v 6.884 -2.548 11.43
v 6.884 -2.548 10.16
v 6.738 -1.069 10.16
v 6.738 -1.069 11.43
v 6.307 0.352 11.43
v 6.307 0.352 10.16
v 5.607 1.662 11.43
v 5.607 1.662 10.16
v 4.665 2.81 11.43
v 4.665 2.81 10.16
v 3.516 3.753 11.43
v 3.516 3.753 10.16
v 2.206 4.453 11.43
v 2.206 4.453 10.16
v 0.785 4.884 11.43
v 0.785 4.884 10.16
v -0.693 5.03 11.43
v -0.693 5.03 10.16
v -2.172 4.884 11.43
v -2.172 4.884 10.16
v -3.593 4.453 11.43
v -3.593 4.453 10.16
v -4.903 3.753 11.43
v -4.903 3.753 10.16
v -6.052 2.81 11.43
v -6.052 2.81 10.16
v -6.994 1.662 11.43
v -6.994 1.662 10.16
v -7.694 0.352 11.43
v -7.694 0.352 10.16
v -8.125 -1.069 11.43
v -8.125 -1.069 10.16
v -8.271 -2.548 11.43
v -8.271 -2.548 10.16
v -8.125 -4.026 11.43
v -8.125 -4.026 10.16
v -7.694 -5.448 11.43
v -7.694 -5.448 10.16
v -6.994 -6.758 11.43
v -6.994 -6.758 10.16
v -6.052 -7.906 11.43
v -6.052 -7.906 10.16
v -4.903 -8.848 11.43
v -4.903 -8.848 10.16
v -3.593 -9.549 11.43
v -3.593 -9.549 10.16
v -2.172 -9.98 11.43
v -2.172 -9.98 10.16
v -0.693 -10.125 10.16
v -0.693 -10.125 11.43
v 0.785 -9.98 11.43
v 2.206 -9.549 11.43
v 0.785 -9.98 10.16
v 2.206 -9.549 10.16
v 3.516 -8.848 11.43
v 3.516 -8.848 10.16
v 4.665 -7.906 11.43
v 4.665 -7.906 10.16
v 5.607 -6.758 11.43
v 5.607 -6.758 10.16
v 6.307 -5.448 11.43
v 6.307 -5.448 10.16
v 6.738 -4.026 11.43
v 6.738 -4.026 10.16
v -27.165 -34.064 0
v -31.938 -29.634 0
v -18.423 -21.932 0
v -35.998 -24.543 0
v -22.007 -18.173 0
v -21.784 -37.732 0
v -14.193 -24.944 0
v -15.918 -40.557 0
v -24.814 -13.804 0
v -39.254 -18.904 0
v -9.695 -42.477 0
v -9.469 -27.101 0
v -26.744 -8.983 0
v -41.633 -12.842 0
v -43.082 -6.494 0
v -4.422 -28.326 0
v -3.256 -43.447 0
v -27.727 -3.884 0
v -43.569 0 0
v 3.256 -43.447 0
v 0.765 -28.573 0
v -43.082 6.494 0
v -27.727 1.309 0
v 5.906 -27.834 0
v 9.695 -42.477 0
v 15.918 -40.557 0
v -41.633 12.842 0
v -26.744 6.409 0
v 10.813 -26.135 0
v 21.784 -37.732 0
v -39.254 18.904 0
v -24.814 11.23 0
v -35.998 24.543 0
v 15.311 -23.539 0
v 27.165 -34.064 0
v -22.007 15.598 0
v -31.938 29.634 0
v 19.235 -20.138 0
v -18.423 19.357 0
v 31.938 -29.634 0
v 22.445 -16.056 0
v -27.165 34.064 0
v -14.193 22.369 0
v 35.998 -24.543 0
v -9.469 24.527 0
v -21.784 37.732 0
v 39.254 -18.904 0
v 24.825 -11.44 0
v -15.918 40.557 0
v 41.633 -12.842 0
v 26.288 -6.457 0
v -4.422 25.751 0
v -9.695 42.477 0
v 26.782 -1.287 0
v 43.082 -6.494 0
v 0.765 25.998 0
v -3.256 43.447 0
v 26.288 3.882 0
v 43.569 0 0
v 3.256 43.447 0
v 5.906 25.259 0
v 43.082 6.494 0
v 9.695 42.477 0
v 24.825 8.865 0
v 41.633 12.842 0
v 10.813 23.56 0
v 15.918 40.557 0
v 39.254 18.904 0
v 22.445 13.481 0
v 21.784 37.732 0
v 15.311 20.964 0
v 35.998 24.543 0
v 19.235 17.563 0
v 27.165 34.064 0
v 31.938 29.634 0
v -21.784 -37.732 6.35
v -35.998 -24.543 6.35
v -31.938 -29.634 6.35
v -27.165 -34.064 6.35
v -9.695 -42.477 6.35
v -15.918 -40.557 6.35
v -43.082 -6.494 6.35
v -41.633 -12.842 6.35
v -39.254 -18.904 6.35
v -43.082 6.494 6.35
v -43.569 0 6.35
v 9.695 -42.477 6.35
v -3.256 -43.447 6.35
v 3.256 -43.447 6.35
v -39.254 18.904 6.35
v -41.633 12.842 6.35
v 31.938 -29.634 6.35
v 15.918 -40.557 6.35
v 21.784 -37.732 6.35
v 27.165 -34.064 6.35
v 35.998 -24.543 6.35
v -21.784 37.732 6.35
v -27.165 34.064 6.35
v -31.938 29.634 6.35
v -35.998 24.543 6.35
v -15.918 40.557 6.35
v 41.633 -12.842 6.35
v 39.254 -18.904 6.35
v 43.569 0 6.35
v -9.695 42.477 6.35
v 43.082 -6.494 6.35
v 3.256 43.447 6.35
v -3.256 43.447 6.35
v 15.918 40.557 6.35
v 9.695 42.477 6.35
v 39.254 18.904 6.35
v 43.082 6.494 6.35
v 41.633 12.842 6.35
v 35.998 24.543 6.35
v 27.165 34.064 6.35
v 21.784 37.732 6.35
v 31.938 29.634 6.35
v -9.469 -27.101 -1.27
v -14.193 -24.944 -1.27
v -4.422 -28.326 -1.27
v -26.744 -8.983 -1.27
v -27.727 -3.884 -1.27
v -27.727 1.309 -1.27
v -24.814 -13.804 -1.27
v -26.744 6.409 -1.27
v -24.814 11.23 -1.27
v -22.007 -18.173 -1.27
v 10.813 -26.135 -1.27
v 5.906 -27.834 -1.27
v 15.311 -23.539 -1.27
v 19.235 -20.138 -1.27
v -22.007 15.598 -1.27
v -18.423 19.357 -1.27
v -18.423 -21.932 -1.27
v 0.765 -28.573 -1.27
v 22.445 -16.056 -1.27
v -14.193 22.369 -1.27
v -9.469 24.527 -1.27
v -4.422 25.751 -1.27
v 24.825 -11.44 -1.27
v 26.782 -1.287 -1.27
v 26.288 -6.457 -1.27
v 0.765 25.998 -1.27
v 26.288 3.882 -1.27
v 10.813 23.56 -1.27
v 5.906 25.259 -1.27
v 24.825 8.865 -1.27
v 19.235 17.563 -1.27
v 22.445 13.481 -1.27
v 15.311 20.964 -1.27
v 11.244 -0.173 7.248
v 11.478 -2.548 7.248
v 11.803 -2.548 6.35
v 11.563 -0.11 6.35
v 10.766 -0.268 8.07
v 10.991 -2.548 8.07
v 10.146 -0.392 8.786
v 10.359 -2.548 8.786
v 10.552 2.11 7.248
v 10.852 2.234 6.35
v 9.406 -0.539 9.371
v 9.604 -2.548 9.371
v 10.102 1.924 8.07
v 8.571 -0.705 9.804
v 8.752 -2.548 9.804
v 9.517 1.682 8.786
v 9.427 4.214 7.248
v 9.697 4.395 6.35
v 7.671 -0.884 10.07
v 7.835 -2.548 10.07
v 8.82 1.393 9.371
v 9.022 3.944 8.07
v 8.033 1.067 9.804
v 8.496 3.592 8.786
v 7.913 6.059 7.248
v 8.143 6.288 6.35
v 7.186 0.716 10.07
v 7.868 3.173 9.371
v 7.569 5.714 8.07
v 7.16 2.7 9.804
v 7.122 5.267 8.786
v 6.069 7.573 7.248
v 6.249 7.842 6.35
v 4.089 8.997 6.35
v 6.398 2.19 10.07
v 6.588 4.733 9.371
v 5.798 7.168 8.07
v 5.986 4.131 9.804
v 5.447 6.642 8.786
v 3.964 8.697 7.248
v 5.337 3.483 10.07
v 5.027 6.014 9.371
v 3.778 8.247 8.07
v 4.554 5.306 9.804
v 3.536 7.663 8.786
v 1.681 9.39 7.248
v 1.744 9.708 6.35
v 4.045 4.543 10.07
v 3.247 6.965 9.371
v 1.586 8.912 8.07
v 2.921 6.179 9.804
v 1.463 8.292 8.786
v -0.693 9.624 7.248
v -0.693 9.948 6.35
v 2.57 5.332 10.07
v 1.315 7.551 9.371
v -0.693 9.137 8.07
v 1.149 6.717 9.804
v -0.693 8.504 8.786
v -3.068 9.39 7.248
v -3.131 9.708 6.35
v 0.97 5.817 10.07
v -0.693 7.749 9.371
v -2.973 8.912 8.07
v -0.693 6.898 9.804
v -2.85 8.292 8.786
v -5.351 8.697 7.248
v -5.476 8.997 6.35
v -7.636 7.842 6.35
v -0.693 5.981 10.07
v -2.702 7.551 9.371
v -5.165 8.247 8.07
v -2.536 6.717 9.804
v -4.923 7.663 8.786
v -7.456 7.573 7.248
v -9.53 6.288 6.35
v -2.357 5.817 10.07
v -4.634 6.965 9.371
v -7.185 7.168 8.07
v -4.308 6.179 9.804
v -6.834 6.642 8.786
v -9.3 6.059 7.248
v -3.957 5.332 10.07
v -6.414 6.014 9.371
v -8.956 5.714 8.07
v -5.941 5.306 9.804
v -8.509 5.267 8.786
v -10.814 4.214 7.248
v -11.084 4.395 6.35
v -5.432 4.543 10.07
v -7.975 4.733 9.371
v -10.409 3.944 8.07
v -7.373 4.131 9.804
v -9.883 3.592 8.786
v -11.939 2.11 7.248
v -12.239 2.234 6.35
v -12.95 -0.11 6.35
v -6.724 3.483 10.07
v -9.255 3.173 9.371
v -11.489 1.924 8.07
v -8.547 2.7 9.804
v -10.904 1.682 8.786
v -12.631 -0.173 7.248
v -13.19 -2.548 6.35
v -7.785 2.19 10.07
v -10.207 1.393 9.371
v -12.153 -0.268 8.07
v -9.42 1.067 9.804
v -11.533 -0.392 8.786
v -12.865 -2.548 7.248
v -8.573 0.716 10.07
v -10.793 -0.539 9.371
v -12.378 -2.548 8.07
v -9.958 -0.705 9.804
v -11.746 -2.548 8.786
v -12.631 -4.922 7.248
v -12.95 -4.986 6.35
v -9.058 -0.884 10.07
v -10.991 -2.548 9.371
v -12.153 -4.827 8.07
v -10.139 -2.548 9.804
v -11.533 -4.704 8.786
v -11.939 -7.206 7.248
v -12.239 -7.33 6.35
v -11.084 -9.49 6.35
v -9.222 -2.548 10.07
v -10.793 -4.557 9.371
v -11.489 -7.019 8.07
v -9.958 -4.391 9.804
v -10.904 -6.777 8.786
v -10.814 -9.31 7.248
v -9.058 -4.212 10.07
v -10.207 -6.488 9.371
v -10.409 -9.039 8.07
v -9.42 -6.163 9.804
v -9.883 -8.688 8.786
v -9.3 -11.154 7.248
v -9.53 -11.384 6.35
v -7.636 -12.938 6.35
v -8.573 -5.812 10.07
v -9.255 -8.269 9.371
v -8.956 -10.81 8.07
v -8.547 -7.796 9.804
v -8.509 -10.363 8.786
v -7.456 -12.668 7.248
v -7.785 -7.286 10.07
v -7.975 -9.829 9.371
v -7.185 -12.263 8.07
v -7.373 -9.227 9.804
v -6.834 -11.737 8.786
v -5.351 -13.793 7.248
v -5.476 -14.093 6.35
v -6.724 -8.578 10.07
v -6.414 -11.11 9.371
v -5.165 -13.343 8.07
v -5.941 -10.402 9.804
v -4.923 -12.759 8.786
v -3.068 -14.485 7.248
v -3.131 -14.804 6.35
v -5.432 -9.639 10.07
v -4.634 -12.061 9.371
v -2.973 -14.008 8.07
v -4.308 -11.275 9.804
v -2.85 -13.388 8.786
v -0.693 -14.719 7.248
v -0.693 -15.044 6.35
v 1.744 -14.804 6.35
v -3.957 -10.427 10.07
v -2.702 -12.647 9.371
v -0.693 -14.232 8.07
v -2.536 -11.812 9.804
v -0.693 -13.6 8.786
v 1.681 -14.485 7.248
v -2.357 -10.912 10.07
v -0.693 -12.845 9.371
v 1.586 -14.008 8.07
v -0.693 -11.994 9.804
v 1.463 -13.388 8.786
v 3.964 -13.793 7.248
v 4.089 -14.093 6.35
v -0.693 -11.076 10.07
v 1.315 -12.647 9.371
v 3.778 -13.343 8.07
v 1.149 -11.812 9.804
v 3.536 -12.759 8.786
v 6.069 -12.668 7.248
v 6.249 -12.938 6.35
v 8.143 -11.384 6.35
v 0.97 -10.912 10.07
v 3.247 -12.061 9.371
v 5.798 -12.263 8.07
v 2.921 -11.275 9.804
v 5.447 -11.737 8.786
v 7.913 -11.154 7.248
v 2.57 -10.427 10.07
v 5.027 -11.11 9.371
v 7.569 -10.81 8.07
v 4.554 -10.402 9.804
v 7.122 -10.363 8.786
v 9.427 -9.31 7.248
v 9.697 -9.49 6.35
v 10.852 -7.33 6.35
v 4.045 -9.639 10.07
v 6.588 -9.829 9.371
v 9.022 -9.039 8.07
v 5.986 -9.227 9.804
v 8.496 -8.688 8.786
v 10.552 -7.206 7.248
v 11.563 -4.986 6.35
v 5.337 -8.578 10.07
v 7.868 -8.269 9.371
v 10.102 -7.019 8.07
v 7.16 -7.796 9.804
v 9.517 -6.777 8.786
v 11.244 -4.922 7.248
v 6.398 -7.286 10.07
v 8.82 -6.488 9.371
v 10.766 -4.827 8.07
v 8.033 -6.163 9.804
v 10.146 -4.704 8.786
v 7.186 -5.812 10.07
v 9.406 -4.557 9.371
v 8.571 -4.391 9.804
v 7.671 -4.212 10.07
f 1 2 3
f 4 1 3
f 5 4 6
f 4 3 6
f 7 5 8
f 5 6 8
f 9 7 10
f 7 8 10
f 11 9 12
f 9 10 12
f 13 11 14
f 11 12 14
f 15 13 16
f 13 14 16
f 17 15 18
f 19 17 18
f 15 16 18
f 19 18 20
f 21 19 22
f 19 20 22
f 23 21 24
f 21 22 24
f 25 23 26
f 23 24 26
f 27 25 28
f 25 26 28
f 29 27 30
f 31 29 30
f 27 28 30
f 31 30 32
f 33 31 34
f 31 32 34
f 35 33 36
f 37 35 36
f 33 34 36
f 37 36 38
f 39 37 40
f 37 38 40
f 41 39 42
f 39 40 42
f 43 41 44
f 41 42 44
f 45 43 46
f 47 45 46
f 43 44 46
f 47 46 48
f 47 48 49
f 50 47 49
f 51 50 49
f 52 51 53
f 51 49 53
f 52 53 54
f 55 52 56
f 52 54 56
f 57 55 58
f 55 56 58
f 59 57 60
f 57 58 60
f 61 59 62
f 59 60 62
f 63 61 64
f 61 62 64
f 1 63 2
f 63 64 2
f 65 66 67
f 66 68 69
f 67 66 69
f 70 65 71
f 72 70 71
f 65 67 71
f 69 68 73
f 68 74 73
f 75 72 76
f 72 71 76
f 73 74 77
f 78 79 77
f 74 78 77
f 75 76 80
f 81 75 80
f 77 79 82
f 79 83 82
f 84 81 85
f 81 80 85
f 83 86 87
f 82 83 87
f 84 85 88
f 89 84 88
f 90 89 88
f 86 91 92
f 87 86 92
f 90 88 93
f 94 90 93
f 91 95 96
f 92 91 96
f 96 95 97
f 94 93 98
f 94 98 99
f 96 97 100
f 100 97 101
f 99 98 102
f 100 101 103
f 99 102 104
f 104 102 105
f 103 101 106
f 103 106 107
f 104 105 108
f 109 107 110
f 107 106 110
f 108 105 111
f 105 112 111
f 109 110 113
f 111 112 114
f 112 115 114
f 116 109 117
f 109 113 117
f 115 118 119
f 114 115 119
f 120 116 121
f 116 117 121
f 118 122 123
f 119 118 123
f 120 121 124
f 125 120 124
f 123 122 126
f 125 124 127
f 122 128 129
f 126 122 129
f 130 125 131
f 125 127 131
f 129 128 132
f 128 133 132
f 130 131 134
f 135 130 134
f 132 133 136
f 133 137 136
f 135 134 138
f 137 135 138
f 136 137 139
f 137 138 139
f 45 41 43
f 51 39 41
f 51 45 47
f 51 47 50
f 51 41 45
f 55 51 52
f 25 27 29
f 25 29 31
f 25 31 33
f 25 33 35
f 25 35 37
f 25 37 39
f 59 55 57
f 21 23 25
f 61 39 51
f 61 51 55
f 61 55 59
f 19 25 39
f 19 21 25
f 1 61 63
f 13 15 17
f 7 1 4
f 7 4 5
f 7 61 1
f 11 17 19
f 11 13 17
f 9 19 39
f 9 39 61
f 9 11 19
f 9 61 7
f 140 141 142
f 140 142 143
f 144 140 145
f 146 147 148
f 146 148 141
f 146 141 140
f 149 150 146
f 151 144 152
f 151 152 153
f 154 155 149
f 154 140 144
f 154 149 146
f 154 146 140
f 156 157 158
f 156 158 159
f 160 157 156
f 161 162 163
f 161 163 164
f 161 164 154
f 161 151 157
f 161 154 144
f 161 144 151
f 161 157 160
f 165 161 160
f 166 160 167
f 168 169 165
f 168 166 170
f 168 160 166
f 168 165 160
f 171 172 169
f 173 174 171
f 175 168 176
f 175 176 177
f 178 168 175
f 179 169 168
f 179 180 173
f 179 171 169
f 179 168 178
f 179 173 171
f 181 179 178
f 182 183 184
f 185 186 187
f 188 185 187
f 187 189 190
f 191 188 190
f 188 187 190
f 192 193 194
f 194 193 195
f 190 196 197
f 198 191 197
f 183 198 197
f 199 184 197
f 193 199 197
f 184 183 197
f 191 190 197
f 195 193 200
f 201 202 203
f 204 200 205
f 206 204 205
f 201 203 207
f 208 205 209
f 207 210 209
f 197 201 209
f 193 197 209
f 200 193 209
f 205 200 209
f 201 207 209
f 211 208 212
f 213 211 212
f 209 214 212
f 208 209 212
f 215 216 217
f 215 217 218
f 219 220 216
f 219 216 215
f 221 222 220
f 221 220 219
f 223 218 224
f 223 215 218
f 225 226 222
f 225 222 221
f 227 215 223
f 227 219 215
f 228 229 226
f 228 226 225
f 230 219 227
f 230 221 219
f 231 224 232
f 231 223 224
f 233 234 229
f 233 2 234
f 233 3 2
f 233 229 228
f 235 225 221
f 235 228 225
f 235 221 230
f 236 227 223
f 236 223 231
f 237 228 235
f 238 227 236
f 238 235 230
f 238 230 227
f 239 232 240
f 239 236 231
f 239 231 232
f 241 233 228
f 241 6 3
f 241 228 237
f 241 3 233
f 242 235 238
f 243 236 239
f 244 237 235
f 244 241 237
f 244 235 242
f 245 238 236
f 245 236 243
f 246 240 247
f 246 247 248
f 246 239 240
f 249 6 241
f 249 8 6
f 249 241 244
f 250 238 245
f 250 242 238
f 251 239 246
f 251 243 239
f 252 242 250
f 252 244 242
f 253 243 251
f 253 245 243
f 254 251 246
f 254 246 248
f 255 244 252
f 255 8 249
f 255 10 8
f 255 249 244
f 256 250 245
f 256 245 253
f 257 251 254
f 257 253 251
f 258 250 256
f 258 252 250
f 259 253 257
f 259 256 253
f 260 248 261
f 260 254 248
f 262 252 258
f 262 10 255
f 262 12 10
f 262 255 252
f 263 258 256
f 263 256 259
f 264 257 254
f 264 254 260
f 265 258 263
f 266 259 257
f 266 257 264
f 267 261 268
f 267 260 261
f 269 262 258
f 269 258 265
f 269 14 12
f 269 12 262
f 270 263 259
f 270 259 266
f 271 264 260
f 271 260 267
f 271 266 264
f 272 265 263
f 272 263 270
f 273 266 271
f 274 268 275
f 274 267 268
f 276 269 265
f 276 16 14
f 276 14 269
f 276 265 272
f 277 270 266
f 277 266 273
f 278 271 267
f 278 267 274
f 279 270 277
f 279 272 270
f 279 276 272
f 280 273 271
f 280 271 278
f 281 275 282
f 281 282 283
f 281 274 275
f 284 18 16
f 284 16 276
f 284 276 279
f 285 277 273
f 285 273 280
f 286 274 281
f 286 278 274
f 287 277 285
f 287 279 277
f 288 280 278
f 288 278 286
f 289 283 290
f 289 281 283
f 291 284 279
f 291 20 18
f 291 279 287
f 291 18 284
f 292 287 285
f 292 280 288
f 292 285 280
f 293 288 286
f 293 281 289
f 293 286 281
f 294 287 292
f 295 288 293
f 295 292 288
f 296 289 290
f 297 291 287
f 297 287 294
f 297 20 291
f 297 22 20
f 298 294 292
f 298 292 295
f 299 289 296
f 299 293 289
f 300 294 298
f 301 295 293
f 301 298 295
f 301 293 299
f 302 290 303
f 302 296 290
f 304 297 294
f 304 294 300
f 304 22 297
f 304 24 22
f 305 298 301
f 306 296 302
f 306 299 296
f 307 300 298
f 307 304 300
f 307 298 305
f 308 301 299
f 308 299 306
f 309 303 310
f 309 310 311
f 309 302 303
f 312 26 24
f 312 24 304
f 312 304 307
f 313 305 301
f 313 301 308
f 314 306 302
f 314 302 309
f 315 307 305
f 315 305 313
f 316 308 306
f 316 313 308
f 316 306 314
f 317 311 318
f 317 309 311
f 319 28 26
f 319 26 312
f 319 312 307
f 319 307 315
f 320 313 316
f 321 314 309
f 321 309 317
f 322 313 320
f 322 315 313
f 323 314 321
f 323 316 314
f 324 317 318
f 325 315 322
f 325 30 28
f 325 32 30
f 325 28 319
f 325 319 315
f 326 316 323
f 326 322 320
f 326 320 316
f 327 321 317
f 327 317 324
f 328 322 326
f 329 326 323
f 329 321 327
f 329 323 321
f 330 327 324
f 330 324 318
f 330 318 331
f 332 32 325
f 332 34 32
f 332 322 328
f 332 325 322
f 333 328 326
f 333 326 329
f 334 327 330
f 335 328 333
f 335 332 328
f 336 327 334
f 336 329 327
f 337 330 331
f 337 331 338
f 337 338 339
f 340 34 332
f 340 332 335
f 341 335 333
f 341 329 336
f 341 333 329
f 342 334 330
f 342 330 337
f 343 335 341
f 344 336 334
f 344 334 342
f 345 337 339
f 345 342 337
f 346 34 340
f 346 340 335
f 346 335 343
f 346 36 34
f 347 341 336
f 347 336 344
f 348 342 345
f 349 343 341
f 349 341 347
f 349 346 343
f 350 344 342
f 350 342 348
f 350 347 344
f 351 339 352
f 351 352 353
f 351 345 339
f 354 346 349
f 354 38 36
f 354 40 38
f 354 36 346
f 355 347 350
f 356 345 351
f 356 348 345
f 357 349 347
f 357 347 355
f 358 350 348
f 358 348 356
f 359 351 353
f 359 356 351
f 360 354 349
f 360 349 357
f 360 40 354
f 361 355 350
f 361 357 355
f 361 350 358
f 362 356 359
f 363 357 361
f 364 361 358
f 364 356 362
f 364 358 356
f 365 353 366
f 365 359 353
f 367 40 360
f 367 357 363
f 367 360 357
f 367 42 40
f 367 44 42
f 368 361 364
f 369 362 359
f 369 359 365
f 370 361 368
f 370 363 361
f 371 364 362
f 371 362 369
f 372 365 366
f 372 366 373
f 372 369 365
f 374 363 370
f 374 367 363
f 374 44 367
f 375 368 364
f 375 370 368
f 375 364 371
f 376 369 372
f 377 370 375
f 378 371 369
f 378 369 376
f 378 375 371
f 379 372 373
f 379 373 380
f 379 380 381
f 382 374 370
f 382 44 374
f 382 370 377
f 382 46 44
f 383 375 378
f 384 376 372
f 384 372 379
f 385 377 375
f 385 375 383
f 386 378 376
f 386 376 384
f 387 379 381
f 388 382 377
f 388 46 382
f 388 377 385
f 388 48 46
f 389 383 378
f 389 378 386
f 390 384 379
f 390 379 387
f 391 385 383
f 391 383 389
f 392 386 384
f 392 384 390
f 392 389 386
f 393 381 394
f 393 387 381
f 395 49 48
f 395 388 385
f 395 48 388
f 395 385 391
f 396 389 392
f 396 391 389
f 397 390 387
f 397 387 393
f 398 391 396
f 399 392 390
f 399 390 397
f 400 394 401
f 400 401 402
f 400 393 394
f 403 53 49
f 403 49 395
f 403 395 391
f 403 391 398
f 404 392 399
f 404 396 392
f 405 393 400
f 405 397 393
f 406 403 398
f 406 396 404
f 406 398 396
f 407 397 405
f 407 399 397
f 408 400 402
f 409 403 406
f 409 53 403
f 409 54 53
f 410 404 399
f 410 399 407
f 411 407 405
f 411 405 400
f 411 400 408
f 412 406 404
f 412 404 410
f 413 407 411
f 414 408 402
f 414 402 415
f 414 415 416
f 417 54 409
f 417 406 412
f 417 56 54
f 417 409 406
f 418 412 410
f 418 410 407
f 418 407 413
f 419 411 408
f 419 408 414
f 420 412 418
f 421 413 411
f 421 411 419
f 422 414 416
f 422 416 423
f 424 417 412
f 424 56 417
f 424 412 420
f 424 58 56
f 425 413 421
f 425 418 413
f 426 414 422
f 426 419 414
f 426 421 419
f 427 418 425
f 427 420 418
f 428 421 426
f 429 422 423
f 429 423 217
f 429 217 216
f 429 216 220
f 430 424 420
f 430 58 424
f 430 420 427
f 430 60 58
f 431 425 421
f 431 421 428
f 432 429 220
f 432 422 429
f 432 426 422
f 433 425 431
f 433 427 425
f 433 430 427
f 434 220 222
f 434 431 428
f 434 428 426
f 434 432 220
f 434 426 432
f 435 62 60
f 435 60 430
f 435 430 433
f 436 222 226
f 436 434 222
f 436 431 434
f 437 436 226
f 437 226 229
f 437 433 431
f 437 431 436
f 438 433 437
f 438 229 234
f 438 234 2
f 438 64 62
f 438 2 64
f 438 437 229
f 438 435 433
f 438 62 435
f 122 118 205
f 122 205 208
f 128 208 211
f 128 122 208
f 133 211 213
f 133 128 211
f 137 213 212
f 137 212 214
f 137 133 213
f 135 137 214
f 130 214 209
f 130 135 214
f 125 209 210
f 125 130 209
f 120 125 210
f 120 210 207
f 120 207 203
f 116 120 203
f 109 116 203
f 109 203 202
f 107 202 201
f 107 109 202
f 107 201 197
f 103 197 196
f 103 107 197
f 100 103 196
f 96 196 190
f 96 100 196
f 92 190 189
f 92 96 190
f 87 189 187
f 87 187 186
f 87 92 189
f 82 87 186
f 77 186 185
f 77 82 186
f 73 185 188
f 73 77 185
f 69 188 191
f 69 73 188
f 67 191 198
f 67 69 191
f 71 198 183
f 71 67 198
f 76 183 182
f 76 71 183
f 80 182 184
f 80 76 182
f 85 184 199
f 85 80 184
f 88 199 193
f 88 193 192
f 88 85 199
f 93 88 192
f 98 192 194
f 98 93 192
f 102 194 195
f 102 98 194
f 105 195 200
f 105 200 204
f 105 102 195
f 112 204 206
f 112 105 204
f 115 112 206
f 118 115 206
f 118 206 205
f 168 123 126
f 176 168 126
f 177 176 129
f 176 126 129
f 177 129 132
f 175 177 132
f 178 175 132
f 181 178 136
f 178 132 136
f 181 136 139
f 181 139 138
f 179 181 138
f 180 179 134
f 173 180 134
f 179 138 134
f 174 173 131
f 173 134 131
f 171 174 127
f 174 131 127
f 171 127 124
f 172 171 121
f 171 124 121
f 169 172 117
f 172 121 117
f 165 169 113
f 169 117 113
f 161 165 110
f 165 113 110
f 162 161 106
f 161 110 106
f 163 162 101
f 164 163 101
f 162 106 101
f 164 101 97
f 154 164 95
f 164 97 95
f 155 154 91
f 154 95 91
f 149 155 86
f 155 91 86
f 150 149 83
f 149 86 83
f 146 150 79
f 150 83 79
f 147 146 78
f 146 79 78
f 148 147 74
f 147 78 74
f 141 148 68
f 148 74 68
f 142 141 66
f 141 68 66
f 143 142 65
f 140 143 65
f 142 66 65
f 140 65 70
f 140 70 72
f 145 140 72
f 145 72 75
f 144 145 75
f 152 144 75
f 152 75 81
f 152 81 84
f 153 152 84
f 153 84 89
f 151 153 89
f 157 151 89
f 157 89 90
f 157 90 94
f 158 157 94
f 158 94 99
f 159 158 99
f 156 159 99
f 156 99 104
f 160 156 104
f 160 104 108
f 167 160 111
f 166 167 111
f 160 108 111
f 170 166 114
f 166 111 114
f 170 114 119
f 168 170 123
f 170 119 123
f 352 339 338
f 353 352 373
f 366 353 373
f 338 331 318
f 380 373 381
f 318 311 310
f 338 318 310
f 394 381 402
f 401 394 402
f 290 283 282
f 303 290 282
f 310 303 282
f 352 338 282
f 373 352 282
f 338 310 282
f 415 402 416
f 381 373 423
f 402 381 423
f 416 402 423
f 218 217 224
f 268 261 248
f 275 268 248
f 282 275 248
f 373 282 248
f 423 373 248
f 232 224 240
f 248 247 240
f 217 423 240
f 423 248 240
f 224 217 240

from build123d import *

# Parameters (mm, degrees)
F0_R     = 43.5689862092
F1_DEPTH = 6.35
F2_R     = 12.4962598147
F3_DEPTH = 3.81
F5_R     = 27.3162889884
F6_DEPTH = 1.27
F7_DEPTH = 1.27


# Not quite as in the source:
# - a fillet or chamfer that OpenCascade refuses, or shapes differently, is made with other operations: its cross-section is extruded or revolved along the edge and cut away or added


with BuildPart() as f1:
    # F0 (on Top) → F1 (new body)
    with BuildSketch(Plane.XY):
        Circle(F0_R)
    extrude(amount=F1_DEPTH)

    # F5 (on Top) → F6 (join)
    with BuildSketch(Plane.XY):
        with Locations((-0.5344543024, -1.2873198139)):
            Circle(F5_R)
    extrude(amount=-F6_DEPTH)


with BuildPart() as f3:
    # F2 (on face) → F3 (new body)
    with BuildSketch(Plane.XY.offset(6.35)):
        with Locations((-0.6934984121, -2.5477914605)):
            Circle(F2_R)
    extrude(amount=F3_DEPTH)

    # F4: fillet of radius 5.08 on 1 edges, made by hand

    # F4_s1 → F4_t2 (revolve, cut)
    with BuildSketch(Plane.XZ.offset(2.5477914605)):
        with BuildLine():
            ThreePointArc((11.8027614026, 6.35), (9.9949245263, 9.0960926284), (6.8840725529, 10.16))
            Line((6.8840725529, 10.16), (11.8027614026, 10.16))
            Line((11.8027614026, 10.16), (11.8027614026, 6.35))
        make_face()
    revolve(axis=Axis((-0.6934984121, -2.5477914605, 10.16), (0, 0, 1)), mode=Mode.SUBTRACT)

    # F7 (add): a face of the model
    f7_faces = [f3.faces().sort_by_distance(p)[0] for p in [
        (-0.6934984121, -2.5477914605, 10.16),
    ]]
    extrude(f7_faces, amount=F7_DEPTH)


solid = Compound([f1.part, f3.part])
